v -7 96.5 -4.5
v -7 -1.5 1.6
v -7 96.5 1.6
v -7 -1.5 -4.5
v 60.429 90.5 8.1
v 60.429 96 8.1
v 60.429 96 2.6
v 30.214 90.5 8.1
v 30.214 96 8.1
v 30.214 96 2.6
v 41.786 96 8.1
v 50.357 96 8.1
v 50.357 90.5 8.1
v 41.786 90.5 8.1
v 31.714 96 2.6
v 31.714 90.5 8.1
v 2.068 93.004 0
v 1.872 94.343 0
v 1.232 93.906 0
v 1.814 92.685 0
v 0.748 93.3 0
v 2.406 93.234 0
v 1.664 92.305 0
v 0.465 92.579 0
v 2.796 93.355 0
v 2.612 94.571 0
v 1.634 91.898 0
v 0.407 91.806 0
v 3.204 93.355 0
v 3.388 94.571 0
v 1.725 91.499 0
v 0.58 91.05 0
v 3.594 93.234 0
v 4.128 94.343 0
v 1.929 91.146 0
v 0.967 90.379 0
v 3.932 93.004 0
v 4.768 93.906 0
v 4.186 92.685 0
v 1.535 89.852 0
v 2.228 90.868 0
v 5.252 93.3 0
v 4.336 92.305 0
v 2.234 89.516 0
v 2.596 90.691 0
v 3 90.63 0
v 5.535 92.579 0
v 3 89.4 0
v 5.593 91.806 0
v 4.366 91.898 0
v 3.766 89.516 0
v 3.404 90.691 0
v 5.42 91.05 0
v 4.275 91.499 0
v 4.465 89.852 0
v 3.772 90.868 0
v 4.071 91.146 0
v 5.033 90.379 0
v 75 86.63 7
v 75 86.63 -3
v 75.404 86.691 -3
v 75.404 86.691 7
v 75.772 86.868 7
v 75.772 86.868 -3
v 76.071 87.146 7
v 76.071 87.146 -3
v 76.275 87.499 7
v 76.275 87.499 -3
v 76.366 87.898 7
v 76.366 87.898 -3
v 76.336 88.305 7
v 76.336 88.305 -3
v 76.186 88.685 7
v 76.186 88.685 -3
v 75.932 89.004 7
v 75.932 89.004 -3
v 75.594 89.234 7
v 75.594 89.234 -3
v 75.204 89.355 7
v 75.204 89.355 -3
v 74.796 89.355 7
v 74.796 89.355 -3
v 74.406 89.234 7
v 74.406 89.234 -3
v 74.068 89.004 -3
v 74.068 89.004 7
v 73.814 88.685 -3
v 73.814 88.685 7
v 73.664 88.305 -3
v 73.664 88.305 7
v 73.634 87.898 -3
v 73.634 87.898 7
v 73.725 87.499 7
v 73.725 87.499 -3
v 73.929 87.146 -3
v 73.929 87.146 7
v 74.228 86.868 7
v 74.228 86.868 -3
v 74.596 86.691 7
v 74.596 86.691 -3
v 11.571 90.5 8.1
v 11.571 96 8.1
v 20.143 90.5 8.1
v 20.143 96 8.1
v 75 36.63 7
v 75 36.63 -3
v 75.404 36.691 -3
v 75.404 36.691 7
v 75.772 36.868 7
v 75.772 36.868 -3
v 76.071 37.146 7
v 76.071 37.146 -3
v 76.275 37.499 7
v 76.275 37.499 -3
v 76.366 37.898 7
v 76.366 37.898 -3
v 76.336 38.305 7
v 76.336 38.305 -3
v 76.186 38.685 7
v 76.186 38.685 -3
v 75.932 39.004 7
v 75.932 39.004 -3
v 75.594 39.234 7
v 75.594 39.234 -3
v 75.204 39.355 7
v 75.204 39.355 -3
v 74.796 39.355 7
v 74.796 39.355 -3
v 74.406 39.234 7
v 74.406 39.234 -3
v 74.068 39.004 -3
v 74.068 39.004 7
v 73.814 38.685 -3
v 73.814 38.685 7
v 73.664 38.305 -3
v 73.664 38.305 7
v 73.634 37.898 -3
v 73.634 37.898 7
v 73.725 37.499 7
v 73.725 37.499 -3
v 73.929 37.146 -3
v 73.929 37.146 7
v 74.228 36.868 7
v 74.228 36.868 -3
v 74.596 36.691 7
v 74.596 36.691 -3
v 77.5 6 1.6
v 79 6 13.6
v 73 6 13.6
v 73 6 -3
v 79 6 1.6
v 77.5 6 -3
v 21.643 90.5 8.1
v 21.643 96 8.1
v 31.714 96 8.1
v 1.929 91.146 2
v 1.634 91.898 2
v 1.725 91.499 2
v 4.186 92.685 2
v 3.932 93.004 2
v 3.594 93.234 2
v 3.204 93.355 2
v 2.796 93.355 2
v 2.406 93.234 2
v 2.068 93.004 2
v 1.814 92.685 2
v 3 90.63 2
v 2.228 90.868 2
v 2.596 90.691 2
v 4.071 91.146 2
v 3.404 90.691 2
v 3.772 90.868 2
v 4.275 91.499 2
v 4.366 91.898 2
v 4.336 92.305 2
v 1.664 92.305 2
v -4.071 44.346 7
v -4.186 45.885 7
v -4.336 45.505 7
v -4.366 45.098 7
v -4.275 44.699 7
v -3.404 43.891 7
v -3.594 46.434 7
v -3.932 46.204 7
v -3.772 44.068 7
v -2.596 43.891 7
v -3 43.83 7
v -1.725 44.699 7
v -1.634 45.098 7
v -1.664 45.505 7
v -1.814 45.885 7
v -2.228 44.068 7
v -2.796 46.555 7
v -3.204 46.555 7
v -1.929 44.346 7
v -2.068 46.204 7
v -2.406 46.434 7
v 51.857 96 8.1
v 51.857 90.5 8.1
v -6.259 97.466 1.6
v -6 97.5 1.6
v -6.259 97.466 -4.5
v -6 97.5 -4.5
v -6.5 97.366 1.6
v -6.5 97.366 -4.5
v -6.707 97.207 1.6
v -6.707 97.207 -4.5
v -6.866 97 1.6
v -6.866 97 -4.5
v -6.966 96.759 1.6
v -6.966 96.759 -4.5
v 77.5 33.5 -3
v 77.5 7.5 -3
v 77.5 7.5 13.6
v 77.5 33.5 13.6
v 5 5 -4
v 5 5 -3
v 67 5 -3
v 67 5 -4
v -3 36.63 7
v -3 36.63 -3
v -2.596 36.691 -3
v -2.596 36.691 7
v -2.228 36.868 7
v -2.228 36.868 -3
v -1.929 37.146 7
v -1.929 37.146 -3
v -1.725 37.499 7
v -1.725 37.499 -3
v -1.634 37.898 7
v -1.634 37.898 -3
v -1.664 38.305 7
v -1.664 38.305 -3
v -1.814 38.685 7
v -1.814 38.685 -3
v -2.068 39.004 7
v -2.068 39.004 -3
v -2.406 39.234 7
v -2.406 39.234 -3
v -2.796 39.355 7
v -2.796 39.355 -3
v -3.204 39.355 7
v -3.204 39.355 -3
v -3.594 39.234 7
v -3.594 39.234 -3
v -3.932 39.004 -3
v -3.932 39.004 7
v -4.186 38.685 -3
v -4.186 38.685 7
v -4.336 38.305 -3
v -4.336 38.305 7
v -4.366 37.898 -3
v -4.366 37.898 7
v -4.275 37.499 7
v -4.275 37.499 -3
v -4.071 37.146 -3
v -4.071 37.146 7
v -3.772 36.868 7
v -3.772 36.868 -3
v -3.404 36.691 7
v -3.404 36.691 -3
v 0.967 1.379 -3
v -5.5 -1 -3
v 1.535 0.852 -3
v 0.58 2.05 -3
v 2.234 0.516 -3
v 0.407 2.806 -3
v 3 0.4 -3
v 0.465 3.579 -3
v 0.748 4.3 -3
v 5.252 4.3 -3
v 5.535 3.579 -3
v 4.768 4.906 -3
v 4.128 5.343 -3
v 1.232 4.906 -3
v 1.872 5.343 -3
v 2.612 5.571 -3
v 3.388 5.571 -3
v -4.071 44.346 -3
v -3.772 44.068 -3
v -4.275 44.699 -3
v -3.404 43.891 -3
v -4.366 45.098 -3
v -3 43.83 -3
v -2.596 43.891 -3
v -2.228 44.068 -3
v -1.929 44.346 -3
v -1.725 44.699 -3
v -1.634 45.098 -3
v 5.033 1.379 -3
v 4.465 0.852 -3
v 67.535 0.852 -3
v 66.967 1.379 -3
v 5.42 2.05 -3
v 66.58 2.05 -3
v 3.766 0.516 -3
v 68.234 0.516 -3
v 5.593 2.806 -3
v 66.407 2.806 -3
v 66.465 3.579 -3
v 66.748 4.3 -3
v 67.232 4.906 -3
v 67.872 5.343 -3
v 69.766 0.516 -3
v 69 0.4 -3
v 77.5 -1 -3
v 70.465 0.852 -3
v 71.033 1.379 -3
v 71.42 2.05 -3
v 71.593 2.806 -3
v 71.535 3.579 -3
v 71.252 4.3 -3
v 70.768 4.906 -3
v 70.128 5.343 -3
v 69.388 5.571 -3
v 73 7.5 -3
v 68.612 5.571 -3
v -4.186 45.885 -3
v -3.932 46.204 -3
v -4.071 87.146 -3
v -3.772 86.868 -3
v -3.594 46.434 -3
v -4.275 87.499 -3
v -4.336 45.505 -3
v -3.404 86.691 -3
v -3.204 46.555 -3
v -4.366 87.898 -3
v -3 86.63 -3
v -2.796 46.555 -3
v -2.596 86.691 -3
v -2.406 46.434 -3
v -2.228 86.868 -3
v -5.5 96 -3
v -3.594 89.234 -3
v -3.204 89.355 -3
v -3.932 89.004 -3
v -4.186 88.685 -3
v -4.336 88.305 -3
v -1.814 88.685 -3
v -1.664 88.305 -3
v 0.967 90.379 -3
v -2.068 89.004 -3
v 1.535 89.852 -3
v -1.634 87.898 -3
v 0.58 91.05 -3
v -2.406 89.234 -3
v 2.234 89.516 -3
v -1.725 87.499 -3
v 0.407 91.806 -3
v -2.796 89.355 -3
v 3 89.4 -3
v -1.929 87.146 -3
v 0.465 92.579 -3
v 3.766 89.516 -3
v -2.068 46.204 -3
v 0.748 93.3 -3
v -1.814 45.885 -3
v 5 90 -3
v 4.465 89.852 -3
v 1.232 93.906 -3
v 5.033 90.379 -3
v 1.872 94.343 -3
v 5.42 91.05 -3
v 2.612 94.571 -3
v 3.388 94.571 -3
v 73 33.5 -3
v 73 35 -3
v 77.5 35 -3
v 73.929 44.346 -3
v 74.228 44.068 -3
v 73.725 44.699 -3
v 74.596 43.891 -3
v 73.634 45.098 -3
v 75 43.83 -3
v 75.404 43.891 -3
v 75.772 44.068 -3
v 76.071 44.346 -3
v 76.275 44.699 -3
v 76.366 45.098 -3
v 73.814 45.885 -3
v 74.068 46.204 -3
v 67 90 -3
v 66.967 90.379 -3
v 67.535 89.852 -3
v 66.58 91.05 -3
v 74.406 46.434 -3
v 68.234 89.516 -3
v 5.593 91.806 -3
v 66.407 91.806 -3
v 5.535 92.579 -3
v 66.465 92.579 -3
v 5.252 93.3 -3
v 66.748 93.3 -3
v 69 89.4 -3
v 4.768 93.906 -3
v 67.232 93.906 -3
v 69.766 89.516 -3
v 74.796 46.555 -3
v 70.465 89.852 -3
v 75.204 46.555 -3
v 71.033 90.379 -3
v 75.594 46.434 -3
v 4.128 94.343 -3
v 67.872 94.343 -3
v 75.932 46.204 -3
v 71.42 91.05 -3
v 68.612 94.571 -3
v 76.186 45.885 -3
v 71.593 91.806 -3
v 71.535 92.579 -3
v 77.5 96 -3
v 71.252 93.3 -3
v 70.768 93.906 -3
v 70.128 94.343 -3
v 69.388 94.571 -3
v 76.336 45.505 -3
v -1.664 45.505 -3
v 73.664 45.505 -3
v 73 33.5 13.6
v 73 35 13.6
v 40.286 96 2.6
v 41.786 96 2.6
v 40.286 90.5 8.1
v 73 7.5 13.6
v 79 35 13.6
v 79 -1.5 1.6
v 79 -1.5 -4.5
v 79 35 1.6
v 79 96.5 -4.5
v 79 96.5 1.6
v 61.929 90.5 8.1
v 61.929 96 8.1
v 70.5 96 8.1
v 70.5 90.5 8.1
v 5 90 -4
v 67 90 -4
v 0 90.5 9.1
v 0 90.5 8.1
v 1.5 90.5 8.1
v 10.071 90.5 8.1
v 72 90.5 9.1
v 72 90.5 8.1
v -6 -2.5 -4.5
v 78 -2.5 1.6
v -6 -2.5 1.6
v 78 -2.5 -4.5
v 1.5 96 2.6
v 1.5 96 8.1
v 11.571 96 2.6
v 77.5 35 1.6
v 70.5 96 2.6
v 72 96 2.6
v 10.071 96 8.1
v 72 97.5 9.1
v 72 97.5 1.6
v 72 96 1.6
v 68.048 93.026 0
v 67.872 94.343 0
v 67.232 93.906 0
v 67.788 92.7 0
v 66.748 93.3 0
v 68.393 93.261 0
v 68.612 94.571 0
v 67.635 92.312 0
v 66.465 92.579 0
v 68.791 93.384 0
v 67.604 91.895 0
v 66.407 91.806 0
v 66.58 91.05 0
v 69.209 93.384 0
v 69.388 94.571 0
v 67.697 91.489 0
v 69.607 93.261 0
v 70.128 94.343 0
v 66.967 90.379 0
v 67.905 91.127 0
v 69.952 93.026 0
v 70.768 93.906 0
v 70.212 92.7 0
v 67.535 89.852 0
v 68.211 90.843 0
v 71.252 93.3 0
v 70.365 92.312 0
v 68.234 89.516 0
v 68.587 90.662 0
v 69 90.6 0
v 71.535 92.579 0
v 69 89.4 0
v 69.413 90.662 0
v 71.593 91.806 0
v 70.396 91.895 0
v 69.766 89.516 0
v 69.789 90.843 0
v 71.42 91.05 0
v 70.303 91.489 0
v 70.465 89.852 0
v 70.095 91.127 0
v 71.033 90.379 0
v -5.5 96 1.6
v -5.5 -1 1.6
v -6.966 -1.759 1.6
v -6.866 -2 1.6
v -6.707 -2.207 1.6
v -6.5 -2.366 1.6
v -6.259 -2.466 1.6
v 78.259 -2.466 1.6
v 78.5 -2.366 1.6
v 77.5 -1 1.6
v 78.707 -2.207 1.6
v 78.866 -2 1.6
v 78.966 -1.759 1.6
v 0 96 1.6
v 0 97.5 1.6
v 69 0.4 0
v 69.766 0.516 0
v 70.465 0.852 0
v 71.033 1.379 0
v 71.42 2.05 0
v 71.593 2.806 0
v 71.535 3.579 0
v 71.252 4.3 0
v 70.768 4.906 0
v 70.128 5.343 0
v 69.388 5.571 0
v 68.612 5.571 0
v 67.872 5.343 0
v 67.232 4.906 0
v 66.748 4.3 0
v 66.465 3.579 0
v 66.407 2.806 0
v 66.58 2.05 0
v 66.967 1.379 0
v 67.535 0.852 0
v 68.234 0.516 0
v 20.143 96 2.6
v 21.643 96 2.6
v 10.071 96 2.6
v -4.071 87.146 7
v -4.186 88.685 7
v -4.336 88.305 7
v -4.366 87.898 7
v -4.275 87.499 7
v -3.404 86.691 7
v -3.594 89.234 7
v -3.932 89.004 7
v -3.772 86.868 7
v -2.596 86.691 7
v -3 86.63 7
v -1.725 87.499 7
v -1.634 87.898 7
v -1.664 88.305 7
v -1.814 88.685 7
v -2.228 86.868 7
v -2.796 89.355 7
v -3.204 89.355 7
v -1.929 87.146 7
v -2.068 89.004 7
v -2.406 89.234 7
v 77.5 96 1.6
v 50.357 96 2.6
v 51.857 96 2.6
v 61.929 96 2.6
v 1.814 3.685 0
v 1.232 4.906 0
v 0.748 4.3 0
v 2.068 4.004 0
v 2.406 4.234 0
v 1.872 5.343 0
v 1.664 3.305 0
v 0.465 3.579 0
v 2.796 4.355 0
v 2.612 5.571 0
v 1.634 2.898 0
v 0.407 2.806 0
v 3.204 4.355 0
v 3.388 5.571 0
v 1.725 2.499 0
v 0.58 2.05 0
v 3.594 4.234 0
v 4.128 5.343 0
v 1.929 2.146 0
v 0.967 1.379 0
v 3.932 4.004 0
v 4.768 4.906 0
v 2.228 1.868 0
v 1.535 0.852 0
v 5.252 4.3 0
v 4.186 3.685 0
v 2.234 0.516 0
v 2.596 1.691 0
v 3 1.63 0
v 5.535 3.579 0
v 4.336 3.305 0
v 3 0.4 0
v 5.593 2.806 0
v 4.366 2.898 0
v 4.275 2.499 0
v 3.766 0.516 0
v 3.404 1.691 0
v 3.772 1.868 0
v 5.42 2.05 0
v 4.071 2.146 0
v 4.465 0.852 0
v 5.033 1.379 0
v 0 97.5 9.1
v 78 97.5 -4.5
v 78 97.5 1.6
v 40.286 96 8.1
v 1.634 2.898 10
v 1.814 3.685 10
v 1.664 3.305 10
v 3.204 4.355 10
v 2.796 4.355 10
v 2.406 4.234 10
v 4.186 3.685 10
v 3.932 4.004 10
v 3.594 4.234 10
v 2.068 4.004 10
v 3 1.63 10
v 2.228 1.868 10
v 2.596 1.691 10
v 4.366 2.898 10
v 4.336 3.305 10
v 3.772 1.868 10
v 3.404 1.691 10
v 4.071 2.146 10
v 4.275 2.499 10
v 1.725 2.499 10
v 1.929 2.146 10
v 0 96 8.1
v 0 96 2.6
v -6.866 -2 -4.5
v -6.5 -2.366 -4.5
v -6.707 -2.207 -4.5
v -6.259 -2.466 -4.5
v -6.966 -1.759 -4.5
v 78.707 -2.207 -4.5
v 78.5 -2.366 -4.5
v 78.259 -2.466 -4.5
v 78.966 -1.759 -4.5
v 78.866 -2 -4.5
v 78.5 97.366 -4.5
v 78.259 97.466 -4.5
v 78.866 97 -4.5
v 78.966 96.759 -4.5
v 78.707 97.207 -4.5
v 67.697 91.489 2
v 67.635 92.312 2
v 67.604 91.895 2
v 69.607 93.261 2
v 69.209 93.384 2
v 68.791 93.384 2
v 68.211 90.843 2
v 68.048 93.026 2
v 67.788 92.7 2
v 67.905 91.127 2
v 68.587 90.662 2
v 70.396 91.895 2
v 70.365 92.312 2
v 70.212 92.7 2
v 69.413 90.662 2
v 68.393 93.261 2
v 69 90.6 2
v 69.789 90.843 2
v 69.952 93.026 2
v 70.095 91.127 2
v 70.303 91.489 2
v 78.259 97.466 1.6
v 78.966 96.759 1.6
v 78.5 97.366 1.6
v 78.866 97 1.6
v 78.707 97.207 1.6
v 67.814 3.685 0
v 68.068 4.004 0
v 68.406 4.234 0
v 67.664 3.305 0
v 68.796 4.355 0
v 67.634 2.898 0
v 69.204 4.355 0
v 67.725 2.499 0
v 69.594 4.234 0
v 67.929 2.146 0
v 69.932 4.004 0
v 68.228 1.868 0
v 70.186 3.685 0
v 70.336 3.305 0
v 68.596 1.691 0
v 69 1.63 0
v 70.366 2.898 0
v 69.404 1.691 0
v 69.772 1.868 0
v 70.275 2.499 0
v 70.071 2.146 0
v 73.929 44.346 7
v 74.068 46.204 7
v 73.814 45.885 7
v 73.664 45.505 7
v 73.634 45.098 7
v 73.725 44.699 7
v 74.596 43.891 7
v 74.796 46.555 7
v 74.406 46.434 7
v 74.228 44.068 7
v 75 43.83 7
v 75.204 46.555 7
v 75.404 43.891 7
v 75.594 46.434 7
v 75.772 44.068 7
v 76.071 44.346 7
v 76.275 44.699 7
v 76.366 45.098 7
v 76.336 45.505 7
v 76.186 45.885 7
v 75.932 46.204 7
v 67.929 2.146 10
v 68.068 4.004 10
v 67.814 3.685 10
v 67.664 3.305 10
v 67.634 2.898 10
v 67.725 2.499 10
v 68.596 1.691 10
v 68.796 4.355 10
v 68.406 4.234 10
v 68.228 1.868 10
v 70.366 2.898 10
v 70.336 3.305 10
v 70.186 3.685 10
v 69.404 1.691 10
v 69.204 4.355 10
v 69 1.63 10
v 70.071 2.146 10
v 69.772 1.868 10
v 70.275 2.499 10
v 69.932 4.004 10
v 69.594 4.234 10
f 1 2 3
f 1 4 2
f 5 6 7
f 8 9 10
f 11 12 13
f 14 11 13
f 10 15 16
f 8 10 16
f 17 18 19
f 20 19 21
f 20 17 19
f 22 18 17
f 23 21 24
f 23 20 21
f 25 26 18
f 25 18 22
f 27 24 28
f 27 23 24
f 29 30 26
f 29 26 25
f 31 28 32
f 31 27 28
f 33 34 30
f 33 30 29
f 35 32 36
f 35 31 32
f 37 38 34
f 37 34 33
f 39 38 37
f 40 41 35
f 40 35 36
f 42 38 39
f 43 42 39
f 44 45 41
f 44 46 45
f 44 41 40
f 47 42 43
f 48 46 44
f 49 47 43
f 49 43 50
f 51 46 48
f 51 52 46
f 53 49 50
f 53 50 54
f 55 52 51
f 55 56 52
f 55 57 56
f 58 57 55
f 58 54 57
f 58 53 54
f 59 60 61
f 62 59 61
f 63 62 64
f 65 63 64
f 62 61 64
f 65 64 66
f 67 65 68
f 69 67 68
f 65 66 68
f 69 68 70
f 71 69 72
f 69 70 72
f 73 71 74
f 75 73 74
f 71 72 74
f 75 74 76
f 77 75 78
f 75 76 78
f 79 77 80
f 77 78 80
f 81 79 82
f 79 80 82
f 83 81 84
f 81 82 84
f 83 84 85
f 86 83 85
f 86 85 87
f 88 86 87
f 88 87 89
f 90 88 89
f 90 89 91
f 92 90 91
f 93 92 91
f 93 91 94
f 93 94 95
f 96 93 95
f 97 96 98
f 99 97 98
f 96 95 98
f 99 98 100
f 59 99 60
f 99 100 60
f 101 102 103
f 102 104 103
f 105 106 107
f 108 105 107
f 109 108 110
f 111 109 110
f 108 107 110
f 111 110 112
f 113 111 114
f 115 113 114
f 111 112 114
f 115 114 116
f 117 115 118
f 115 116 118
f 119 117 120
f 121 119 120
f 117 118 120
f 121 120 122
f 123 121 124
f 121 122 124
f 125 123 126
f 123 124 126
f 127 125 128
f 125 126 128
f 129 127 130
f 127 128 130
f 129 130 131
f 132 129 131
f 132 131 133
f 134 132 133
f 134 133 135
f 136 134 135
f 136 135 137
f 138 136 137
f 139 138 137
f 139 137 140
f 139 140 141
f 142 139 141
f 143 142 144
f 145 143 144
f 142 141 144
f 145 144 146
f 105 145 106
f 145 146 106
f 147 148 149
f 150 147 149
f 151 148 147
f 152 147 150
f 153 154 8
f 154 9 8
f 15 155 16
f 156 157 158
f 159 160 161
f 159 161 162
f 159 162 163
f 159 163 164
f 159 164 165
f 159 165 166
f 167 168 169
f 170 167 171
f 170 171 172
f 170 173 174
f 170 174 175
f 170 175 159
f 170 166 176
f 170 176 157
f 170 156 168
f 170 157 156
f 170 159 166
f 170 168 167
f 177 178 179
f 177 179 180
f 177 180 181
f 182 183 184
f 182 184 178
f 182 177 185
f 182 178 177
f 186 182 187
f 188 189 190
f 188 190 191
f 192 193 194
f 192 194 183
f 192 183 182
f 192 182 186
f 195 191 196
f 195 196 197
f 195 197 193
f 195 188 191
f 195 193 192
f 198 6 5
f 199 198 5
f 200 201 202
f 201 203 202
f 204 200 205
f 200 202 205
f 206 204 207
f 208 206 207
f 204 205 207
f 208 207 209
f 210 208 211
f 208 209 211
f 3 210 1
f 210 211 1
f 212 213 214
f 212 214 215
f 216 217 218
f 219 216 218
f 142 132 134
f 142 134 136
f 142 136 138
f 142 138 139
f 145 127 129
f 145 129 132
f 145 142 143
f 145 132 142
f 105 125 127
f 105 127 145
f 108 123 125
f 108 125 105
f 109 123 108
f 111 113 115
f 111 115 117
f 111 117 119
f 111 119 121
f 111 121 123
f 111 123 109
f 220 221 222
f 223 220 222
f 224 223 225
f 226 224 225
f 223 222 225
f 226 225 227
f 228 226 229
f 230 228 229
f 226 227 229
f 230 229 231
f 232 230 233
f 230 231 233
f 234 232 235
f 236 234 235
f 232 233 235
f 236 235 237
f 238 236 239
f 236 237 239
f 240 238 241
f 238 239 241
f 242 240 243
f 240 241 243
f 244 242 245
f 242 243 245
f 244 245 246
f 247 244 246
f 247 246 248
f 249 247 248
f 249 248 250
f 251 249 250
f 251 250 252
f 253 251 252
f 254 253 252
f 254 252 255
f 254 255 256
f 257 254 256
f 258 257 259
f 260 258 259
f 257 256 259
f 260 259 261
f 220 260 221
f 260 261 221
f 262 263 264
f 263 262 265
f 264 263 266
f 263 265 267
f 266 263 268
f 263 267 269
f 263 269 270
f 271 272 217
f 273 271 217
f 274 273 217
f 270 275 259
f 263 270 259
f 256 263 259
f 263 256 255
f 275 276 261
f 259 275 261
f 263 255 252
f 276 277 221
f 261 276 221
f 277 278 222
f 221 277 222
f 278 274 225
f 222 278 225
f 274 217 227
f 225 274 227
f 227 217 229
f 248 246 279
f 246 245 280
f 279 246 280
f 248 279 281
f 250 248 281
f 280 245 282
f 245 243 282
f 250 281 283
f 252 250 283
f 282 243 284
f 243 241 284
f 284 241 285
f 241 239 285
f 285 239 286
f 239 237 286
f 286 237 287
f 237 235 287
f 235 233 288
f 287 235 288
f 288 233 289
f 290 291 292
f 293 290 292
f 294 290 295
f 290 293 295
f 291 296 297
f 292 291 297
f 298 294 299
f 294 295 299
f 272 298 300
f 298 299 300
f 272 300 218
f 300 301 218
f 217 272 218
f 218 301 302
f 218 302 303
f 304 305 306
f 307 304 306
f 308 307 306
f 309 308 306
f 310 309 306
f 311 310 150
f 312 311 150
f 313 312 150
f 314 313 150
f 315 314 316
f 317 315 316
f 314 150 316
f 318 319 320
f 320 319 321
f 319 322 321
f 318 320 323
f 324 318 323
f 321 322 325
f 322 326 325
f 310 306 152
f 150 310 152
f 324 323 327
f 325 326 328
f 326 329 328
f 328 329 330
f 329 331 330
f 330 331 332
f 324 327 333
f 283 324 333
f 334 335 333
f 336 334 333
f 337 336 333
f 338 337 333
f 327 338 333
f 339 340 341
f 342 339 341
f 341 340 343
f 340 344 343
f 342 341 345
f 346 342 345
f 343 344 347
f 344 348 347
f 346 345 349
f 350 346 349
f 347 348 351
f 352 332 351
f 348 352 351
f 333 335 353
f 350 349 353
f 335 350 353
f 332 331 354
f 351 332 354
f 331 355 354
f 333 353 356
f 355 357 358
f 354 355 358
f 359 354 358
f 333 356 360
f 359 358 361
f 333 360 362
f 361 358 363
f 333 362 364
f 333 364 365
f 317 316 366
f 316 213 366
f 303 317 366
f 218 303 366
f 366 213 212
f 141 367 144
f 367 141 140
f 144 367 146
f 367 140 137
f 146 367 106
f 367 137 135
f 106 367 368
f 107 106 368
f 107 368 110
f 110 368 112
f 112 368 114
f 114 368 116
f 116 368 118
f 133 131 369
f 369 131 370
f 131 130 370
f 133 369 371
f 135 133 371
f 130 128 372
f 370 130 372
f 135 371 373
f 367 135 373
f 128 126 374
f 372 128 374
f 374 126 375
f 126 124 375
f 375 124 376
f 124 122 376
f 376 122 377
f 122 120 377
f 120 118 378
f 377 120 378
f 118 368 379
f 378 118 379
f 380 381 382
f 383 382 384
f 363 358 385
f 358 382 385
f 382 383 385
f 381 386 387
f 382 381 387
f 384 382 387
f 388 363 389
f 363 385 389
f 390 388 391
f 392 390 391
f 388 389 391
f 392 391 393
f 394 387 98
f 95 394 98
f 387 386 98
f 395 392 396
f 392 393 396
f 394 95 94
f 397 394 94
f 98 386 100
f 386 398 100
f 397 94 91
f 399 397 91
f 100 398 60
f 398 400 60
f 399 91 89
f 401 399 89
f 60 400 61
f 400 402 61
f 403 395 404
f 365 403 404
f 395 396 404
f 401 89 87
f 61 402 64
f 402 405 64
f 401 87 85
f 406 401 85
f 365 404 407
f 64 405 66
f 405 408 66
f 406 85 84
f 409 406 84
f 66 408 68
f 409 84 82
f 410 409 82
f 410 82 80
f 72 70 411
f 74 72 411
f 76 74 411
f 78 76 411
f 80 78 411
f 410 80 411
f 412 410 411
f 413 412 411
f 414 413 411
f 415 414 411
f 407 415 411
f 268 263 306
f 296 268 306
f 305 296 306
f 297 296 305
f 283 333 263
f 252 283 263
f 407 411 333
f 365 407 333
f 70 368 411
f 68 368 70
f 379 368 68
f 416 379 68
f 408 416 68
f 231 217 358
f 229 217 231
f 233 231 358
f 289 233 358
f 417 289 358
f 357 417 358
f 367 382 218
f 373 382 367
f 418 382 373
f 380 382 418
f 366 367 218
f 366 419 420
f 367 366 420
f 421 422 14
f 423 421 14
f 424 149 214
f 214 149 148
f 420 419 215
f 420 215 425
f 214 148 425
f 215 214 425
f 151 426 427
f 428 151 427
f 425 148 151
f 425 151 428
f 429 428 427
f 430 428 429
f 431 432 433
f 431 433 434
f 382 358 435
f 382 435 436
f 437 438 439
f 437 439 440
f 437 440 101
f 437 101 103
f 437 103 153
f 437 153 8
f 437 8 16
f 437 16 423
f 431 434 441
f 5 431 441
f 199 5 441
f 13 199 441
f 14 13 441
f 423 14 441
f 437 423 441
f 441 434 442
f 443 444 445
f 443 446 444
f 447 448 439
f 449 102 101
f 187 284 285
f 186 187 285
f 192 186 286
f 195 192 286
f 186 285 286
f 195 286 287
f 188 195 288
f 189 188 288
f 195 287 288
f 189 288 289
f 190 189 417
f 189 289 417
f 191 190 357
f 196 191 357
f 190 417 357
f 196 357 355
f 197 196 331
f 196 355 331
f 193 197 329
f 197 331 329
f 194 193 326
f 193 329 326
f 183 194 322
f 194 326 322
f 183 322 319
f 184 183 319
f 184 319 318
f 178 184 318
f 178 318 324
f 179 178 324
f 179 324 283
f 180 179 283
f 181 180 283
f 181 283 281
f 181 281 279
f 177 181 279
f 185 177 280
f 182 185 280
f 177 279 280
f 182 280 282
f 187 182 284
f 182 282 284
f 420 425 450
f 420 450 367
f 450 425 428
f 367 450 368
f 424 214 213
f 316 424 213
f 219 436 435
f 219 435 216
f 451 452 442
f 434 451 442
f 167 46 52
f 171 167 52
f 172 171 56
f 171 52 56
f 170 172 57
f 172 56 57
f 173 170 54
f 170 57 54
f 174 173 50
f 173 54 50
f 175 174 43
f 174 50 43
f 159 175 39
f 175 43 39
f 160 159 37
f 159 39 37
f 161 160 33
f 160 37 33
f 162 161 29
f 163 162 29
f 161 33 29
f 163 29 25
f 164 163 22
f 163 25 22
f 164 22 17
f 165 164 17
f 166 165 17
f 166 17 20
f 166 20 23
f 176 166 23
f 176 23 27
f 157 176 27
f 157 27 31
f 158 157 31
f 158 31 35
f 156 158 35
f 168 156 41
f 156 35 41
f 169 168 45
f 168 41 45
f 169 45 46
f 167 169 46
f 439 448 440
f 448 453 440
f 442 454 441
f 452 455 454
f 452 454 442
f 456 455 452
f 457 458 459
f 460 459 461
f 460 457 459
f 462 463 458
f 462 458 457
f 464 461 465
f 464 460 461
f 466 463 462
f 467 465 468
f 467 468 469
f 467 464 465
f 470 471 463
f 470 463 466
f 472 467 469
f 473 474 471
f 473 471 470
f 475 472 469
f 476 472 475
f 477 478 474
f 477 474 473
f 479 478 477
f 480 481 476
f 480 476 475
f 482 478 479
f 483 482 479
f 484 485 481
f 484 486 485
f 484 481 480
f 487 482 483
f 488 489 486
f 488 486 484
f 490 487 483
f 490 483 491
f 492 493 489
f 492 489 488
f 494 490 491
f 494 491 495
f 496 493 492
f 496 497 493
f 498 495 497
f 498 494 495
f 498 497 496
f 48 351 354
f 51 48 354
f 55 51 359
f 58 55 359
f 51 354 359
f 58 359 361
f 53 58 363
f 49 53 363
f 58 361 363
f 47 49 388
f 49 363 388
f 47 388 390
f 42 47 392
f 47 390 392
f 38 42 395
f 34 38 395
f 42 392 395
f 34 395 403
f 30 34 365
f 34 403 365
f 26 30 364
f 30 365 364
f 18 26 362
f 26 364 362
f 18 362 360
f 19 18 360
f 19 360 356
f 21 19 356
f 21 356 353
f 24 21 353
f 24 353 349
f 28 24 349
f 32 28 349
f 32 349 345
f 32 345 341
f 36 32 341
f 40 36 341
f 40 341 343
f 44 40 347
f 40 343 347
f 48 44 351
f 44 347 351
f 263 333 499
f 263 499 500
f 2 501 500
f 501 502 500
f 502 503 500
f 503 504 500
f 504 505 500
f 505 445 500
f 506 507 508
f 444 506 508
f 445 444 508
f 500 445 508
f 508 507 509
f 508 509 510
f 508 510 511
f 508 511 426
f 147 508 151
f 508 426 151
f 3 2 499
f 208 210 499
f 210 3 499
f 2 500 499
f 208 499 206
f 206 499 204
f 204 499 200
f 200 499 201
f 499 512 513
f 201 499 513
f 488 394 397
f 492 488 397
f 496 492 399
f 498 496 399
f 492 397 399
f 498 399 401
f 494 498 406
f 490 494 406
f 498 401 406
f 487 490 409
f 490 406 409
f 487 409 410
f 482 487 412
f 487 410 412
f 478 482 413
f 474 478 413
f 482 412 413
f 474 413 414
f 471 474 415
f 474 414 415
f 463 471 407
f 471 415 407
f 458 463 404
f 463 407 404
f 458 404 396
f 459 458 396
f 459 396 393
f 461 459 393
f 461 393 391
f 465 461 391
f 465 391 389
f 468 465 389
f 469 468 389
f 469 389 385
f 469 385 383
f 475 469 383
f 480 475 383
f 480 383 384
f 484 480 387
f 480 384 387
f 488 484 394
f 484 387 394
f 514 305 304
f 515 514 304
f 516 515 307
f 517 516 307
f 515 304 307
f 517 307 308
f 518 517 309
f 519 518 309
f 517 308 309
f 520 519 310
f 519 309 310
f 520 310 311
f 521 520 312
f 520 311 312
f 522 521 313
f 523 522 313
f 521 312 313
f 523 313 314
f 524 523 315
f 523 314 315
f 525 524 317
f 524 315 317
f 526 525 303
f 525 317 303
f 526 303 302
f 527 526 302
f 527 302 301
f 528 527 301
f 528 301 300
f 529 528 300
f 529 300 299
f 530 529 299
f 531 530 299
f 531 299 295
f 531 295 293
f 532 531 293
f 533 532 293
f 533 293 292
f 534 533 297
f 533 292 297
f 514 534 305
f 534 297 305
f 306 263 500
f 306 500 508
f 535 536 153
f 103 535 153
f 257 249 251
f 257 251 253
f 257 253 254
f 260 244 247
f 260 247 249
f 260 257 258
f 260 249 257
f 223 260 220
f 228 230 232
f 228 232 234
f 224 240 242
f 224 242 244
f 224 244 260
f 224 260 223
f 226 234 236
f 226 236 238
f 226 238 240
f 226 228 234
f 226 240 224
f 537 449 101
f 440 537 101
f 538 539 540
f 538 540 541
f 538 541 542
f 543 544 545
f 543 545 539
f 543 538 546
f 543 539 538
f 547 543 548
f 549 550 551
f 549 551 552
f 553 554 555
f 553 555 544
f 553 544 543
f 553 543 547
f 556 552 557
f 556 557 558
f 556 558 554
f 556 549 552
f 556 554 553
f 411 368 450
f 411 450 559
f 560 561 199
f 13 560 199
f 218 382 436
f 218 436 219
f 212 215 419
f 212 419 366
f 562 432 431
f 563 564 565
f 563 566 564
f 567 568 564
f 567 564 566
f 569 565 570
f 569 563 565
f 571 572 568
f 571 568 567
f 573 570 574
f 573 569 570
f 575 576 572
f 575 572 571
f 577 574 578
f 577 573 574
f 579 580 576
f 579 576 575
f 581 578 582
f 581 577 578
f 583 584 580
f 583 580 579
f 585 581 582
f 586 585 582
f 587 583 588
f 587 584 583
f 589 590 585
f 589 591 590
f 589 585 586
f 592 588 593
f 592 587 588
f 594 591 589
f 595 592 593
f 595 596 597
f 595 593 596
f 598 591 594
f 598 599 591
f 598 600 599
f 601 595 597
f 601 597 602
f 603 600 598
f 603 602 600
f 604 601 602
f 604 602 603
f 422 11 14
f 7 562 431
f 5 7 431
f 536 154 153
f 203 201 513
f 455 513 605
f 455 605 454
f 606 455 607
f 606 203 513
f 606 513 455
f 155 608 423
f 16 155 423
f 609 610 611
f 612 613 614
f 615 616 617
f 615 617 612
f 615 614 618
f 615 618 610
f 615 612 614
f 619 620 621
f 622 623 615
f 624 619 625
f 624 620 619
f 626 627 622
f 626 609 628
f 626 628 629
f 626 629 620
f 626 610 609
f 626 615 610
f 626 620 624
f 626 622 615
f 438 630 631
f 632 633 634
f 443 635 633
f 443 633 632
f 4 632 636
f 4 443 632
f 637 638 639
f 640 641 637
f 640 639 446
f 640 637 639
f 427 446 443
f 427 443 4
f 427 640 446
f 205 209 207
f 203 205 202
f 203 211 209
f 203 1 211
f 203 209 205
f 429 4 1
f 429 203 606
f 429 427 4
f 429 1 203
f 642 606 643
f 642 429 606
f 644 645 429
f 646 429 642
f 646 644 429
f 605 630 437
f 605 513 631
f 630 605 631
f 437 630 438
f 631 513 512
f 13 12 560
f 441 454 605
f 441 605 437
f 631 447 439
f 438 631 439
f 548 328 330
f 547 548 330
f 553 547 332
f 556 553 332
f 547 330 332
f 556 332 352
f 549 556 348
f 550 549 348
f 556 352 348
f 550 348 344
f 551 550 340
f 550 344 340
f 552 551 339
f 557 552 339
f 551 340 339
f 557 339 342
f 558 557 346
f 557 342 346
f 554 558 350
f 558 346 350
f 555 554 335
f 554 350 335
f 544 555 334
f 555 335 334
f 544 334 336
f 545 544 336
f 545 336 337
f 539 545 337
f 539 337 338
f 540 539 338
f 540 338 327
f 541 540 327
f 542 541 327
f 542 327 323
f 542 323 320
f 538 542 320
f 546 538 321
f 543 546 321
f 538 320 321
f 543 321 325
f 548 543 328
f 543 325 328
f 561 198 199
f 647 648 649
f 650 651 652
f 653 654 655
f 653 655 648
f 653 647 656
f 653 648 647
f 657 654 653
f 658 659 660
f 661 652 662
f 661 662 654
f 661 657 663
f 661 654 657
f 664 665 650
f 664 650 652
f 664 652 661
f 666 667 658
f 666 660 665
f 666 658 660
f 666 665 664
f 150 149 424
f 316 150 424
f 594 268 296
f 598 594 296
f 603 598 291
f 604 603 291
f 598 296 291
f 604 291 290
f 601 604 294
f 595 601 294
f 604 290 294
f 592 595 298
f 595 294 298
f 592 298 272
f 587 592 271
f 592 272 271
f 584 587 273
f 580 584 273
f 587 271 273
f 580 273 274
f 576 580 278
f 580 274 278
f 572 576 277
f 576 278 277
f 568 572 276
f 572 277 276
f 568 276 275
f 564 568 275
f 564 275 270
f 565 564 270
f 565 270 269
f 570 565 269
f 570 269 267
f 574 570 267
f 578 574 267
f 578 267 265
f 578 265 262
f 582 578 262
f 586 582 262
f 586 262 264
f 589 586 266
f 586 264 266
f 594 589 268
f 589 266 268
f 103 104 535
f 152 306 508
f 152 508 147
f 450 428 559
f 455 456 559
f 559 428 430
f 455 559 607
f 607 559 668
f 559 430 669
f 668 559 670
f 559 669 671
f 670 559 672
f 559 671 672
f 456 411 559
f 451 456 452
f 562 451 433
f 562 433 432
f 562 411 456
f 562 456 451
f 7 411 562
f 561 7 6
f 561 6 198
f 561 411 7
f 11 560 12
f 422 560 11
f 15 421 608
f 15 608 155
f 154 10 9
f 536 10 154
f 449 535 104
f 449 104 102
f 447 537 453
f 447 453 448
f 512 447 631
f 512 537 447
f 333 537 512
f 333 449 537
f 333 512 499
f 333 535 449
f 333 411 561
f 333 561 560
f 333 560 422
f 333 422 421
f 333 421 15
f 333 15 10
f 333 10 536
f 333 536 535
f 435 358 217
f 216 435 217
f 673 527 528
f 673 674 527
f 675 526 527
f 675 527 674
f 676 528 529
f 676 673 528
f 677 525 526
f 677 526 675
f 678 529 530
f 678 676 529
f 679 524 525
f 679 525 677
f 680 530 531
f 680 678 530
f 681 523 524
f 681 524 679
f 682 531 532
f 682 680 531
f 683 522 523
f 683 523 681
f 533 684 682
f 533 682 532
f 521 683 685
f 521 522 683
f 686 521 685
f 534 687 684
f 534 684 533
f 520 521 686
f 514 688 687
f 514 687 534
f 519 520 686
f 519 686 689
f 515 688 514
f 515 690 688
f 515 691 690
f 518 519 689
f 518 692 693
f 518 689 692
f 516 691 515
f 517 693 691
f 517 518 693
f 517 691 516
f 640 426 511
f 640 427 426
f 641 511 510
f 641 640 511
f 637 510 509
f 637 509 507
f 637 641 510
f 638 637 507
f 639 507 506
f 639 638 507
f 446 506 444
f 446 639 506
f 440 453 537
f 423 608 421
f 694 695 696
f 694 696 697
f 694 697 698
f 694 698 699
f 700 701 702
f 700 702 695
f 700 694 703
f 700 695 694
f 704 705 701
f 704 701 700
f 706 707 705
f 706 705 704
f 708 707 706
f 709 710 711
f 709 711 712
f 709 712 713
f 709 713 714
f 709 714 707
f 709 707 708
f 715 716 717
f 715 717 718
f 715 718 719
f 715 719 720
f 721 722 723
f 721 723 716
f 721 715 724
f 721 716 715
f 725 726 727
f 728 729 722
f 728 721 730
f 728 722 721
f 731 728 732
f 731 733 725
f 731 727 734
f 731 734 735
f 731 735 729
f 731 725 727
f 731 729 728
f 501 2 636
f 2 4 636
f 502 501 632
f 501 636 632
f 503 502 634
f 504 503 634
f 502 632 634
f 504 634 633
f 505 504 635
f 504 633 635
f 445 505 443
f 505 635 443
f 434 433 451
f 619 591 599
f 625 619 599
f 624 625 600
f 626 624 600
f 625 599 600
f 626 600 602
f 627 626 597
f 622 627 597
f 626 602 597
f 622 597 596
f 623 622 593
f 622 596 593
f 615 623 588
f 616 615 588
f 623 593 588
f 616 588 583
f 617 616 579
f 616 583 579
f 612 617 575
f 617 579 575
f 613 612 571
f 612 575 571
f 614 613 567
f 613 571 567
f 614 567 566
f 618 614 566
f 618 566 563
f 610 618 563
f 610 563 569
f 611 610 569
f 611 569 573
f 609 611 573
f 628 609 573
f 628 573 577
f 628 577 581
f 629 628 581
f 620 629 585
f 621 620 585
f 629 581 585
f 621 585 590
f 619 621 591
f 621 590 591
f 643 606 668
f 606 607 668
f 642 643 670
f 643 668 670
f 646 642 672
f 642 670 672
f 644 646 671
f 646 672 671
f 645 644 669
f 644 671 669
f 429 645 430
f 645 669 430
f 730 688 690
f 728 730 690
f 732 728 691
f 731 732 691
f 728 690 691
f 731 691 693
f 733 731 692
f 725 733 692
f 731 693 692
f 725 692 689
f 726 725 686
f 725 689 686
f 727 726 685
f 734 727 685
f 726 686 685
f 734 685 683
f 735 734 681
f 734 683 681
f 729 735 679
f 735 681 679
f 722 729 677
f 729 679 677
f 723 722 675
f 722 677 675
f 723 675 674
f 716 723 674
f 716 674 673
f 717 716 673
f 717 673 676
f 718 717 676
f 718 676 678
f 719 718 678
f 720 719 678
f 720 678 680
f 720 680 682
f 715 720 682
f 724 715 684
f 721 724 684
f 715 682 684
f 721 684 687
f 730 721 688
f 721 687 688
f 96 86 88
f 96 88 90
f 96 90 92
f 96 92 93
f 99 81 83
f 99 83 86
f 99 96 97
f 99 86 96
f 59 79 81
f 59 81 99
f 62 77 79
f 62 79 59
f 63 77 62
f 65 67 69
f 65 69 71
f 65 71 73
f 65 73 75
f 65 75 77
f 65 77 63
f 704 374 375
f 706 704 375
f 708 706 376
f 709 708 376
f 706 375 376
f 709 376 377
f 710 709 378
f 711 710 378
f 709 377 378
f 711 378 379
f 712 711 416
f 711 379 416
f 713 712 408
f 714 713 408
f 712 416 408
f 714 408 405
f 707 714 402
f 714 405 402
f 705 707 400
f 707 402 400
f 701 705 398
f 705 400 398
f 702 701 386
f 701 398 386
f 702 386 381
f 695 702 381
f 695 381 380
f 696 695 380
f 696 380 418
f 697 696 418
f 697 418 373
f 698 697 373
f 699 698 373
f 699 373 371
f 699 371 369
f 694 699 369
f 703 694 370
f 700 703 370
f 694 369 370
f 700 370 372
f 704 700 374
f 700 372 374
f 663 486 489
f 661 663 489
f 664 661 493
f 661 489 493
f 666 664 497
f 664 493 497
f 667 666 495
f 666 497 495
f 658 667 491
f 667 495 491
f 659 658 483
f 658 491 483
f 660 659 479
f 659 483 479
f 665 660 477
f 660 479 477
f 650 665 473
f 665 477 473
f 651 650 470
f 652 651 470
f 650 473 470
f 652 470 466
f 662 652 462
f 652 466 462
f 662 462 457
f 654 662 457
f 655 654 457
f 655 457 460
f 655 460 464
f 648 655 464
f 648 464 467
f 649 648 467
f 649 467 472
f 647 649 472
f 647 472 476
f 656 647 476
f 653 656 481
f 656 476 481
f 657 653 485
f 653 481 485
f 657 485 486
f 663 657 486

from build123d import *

# Parameters (mm, degrees)
SKETCH002_W            = 100
SKETCH002_H            = 1.5
PAD001_DEPTH           = 79
PAD001_DEPTH_BACK      = 7
SKETCH004_R            = 2.6
PAD003_DEPTH           = 3
SKETCH007_W            = 29
SKETCH007_H            = 1.5
PAD006_DEPTH           = 16.6
SKETCH008_W            = 29
SKETCH008_H            = 16.6
PAD007_DEPTH           = 4.5
SKETCH009_W            = 26
SKETCH009_H            = 16.6
POCKET001_DEPTH        = 10
SKETCH010_W            = 85
SKETCH010_H            = 62
POCKET002_DEPTH        = 1
PAD009_DEPTH           = 4.6
SKETCH019_W            = 1.5
SKETCH019_H            = 72
PAD015_DEPTH           = 6.5
PAD016_DEPTH           = 1.5
LINEARPATTERN_COUNT    = 8
LINEARPATTERN_PITCH    = 10.071429
SKETCH021_W            = 7
SKETCH021_H            = 72
PAD017_DEPTH           = 1
SKETCH022_R            = 1.4
SKETCH022_R_2          = 1.37
PAD023_DEPTH           = 2
SKETCH029_R            = 1.37
PAD024_DEPTH           = 10
SKETCH031_R            = 1.37
PAD026_DEPTH           = 10
FILLET001_R            = 1
LINEARPATTERN001_COUNT = 2
LINEARPATTERN001_PITCH = 42.8
SKETCH036_R            = 1.37
PAD029_DEPTH           = 10


with BuildPart() as part:
    # Sketch002 → Pad001 (new body, two sides)
    with BuildSketch(Plane.YZ) as pad001_sk:
        with Locations((47.5, -3.75)):
            Rectangle(SKETCH002_W, SKETCH002_H)
    extrude(amount=PAD001_DEPTH)
    extrude(pad001_sk.sketch, amount=-PAD001_DEPTH_BACK)

    # Sketch004 (on Face1 of Pad001) → Pad003 (join)
    with BuildSketch(Plane(origin=(0, 0, -3), x_dir=(0, -1, 0), z_dir=(0, 0, 1))):
        with Locations((-3, 3)):
            Circle(SKETCH004_R)
        with Locations((-3, 69)):
            Circle(SKETCH004_R)
        with Locations((-92, 3)):
            Circle(SKETCH004_R)
        with Locations((-92, 69)):
            Circle(SKETCH004_R)
    extrude(amount=PAD003_DEPTH)

    # Sketch007 (on Face1 of Pad003) → Pad006 (join)
    with BuildSketch(Plane(origin=(0, 0, -3), x_dir=(0, -1, 0), z_dir=(0, 0, 1))):
        with Locations((-20.5, 78.25)):
            Rectangle(SKETCH007_W, SKETCH007_H)
    extrude(amount=PAD006_DEPTH)

    # Sketch008 (on Face6 of Pad006) → Pad007 (join)
    with BuildSketch(Plane(origin=(77.5, 0, 0), x_dir=(0, 1, 0), z_dir=(-1, 0, 0))):
        with Locations((20.5, -5.3)):
            Rectangle(SKETCH008_W, SKETCH008_H)
    extrude(amount=PAD007_DEPTH)

    # Sketch009 (on Face6 of Pad006) → Pocket001 (cut)
    with BuildSketch(Plane(origin=(77.5, 0, 0), x_dir=(0, 1, 0), z_dir=(-1, 0, 0))):
        with Locations((20.5, -5.3)):
            Rectangle(SKETCH009_W, SKETCH009_H)
    extrude(amount=POCKET001_DEPTH, mode=Mode.SUBTRACT)

    # Sketch010 (on Face1 of Pocket001) → Pocket002 (cut)
    with BuildSketch(Plane(origin=(0, 0, -3), x_dir=(0, -1, 0), z_dir=(0, 0, 1))):
        with Locations((-47.5, 36)):
            Rectangle(SKETCH010_W, SKETCH010_H)
    extrude(amount=-POCKET002_DEPTH, mode=Mode.SUBTRACT)

    # Sketch012 (on Face1 of Pocket002) → Pad009 (join)
    with BuildSketch(Plane(origin=(0, 0, -3), x_dir=(0, -1, 0), z_dir=(0, 0, 1))):
        Polygon((-35, 79), (-35, 77.5), (-96, 77.5), (-96, -5.5), (1, -5.5), (1, 77.5), (-6, 77.5), (-6, 79), (2.5, 79), (2.5, -7), (-97.5, -7), (-97.5, 79), align=None)
    extrude(amount=PAD009_DEPTH)

    # Sketch019 (on Face20 of Pad009) → Pad015 (join)
    with BuildSketch(Plane(origin=(0, 0, 1.6), x_dir=(0, -1, 0), z_dir=(0, 0, 1))):
        with Locations((-96.75, 36)):
            Rectangle(SKETCH019_W, SKETCH019_H)
    extrude(amount=PAD015_DEPTH)

    # Sketch020 (on Face41 of Pad015) → Pad016 (join)
    with BuildSketch(Plane.YZ.offset(72)):
        Polygon((96, 8.1), (96, 2.6), (90.5, 8.1), align=None)
    pad016 = extrude(amount=-PAD016_DEPTH)

    # LinearPattern: Pad016 ×8
    with Locations(*[(-i * LINEARPATTERN_PITCH, 0, 0) for i in range(1, LINEARPATTERN_COUNT)]):
        add(pad016)

    # Sketch021 (on Face44 of LinearPattern) → Pad017 (join)
    with BuildSketch(Plane(origin=(0, 0, 8.1), x_dir=(0, -1, 0), z_dir=(0, 0, 1))):
        with Locations((-94, 36)):
            Rectangle(SKETCH021_W, SKETCH021_H)
    extrude(amount=PAD017_DEPTH)

    # Sketch022 (on Face31 of Pad017) → Pad023 (join)
    with BuildSketch(Plane(origin=(0, 0, 0), x_dir=(0, -1, 0), z_dir=(0, 0, 1))):
        with Locations((-92, 69)):
            Circle(SKETCH022_R)
        with Locations((-92, 3)):
            Circle(SKETCH022_R_2)
    extrude(amount=PAD023_DEPTH)

    # Sketch029 (on Face32 of Pad023) → Pad024 (join)
    with BuildSketch(Plane(origin=(0, 0, 0), x_dir=(0, -1, 0), z_dir=(0, 0, 1))):
        with Locations((-3, 69)):
            Circle(SKETCH029_R)
        with Locations((-3, 3)):
            Circle(SKETCH029_R)
    extrude(amount=PAD024_DEPTH)

    # Sketch031 (on Face1 of Pad024) → Pad026 (join)
    with BuildSketch(Plane(origin=(0, 0, -3), x_dir=(0, -1, 0), z_dir=(0, 0, 1))):
        with Locations((-88, -3)):
            Circle(SKETCH031_R)
        with Locations((-88, 75)):
            Circle(SKETCH031_R)
    pad026 = extrude(amount=PAD026_DEPTH)

    # Fillet001
    fillet001_edges = [part.edges().sort_by_distance(p)[0] for p in [
        (79, 97.5, -0.7),
        (-7, 97.5, -0.7),
        (-7, -2.5, -0.7),
        (79, -2.5, -0.7),
    ]]
    fillet(fillet001_edges, radius=FILLET001_R)

    # LinearPattern001: Pad026 ×2
    with Locations(*[(0, -i * LINEARPATTERN001_PITCH, 0) for i in range(1, LINEARPATTERN001_COUNT)]):
        add(pad026)

    # Sketch036 (on Face21 of LinearPattern001) → Pad029 (join)
    with BuildSketch(Plane(origin=(0, 0, -3), x_dir=(0, -1, 0), z_dir=(0, 0, 1))):
        with Locations((-38, 75)):
            Circle(SKETCH036_R)
        with Locations((-38, -3)):
            Circle(SKETCH036_R)
    extrude(amount=PAD029_DEPTH)


solid = part.part
